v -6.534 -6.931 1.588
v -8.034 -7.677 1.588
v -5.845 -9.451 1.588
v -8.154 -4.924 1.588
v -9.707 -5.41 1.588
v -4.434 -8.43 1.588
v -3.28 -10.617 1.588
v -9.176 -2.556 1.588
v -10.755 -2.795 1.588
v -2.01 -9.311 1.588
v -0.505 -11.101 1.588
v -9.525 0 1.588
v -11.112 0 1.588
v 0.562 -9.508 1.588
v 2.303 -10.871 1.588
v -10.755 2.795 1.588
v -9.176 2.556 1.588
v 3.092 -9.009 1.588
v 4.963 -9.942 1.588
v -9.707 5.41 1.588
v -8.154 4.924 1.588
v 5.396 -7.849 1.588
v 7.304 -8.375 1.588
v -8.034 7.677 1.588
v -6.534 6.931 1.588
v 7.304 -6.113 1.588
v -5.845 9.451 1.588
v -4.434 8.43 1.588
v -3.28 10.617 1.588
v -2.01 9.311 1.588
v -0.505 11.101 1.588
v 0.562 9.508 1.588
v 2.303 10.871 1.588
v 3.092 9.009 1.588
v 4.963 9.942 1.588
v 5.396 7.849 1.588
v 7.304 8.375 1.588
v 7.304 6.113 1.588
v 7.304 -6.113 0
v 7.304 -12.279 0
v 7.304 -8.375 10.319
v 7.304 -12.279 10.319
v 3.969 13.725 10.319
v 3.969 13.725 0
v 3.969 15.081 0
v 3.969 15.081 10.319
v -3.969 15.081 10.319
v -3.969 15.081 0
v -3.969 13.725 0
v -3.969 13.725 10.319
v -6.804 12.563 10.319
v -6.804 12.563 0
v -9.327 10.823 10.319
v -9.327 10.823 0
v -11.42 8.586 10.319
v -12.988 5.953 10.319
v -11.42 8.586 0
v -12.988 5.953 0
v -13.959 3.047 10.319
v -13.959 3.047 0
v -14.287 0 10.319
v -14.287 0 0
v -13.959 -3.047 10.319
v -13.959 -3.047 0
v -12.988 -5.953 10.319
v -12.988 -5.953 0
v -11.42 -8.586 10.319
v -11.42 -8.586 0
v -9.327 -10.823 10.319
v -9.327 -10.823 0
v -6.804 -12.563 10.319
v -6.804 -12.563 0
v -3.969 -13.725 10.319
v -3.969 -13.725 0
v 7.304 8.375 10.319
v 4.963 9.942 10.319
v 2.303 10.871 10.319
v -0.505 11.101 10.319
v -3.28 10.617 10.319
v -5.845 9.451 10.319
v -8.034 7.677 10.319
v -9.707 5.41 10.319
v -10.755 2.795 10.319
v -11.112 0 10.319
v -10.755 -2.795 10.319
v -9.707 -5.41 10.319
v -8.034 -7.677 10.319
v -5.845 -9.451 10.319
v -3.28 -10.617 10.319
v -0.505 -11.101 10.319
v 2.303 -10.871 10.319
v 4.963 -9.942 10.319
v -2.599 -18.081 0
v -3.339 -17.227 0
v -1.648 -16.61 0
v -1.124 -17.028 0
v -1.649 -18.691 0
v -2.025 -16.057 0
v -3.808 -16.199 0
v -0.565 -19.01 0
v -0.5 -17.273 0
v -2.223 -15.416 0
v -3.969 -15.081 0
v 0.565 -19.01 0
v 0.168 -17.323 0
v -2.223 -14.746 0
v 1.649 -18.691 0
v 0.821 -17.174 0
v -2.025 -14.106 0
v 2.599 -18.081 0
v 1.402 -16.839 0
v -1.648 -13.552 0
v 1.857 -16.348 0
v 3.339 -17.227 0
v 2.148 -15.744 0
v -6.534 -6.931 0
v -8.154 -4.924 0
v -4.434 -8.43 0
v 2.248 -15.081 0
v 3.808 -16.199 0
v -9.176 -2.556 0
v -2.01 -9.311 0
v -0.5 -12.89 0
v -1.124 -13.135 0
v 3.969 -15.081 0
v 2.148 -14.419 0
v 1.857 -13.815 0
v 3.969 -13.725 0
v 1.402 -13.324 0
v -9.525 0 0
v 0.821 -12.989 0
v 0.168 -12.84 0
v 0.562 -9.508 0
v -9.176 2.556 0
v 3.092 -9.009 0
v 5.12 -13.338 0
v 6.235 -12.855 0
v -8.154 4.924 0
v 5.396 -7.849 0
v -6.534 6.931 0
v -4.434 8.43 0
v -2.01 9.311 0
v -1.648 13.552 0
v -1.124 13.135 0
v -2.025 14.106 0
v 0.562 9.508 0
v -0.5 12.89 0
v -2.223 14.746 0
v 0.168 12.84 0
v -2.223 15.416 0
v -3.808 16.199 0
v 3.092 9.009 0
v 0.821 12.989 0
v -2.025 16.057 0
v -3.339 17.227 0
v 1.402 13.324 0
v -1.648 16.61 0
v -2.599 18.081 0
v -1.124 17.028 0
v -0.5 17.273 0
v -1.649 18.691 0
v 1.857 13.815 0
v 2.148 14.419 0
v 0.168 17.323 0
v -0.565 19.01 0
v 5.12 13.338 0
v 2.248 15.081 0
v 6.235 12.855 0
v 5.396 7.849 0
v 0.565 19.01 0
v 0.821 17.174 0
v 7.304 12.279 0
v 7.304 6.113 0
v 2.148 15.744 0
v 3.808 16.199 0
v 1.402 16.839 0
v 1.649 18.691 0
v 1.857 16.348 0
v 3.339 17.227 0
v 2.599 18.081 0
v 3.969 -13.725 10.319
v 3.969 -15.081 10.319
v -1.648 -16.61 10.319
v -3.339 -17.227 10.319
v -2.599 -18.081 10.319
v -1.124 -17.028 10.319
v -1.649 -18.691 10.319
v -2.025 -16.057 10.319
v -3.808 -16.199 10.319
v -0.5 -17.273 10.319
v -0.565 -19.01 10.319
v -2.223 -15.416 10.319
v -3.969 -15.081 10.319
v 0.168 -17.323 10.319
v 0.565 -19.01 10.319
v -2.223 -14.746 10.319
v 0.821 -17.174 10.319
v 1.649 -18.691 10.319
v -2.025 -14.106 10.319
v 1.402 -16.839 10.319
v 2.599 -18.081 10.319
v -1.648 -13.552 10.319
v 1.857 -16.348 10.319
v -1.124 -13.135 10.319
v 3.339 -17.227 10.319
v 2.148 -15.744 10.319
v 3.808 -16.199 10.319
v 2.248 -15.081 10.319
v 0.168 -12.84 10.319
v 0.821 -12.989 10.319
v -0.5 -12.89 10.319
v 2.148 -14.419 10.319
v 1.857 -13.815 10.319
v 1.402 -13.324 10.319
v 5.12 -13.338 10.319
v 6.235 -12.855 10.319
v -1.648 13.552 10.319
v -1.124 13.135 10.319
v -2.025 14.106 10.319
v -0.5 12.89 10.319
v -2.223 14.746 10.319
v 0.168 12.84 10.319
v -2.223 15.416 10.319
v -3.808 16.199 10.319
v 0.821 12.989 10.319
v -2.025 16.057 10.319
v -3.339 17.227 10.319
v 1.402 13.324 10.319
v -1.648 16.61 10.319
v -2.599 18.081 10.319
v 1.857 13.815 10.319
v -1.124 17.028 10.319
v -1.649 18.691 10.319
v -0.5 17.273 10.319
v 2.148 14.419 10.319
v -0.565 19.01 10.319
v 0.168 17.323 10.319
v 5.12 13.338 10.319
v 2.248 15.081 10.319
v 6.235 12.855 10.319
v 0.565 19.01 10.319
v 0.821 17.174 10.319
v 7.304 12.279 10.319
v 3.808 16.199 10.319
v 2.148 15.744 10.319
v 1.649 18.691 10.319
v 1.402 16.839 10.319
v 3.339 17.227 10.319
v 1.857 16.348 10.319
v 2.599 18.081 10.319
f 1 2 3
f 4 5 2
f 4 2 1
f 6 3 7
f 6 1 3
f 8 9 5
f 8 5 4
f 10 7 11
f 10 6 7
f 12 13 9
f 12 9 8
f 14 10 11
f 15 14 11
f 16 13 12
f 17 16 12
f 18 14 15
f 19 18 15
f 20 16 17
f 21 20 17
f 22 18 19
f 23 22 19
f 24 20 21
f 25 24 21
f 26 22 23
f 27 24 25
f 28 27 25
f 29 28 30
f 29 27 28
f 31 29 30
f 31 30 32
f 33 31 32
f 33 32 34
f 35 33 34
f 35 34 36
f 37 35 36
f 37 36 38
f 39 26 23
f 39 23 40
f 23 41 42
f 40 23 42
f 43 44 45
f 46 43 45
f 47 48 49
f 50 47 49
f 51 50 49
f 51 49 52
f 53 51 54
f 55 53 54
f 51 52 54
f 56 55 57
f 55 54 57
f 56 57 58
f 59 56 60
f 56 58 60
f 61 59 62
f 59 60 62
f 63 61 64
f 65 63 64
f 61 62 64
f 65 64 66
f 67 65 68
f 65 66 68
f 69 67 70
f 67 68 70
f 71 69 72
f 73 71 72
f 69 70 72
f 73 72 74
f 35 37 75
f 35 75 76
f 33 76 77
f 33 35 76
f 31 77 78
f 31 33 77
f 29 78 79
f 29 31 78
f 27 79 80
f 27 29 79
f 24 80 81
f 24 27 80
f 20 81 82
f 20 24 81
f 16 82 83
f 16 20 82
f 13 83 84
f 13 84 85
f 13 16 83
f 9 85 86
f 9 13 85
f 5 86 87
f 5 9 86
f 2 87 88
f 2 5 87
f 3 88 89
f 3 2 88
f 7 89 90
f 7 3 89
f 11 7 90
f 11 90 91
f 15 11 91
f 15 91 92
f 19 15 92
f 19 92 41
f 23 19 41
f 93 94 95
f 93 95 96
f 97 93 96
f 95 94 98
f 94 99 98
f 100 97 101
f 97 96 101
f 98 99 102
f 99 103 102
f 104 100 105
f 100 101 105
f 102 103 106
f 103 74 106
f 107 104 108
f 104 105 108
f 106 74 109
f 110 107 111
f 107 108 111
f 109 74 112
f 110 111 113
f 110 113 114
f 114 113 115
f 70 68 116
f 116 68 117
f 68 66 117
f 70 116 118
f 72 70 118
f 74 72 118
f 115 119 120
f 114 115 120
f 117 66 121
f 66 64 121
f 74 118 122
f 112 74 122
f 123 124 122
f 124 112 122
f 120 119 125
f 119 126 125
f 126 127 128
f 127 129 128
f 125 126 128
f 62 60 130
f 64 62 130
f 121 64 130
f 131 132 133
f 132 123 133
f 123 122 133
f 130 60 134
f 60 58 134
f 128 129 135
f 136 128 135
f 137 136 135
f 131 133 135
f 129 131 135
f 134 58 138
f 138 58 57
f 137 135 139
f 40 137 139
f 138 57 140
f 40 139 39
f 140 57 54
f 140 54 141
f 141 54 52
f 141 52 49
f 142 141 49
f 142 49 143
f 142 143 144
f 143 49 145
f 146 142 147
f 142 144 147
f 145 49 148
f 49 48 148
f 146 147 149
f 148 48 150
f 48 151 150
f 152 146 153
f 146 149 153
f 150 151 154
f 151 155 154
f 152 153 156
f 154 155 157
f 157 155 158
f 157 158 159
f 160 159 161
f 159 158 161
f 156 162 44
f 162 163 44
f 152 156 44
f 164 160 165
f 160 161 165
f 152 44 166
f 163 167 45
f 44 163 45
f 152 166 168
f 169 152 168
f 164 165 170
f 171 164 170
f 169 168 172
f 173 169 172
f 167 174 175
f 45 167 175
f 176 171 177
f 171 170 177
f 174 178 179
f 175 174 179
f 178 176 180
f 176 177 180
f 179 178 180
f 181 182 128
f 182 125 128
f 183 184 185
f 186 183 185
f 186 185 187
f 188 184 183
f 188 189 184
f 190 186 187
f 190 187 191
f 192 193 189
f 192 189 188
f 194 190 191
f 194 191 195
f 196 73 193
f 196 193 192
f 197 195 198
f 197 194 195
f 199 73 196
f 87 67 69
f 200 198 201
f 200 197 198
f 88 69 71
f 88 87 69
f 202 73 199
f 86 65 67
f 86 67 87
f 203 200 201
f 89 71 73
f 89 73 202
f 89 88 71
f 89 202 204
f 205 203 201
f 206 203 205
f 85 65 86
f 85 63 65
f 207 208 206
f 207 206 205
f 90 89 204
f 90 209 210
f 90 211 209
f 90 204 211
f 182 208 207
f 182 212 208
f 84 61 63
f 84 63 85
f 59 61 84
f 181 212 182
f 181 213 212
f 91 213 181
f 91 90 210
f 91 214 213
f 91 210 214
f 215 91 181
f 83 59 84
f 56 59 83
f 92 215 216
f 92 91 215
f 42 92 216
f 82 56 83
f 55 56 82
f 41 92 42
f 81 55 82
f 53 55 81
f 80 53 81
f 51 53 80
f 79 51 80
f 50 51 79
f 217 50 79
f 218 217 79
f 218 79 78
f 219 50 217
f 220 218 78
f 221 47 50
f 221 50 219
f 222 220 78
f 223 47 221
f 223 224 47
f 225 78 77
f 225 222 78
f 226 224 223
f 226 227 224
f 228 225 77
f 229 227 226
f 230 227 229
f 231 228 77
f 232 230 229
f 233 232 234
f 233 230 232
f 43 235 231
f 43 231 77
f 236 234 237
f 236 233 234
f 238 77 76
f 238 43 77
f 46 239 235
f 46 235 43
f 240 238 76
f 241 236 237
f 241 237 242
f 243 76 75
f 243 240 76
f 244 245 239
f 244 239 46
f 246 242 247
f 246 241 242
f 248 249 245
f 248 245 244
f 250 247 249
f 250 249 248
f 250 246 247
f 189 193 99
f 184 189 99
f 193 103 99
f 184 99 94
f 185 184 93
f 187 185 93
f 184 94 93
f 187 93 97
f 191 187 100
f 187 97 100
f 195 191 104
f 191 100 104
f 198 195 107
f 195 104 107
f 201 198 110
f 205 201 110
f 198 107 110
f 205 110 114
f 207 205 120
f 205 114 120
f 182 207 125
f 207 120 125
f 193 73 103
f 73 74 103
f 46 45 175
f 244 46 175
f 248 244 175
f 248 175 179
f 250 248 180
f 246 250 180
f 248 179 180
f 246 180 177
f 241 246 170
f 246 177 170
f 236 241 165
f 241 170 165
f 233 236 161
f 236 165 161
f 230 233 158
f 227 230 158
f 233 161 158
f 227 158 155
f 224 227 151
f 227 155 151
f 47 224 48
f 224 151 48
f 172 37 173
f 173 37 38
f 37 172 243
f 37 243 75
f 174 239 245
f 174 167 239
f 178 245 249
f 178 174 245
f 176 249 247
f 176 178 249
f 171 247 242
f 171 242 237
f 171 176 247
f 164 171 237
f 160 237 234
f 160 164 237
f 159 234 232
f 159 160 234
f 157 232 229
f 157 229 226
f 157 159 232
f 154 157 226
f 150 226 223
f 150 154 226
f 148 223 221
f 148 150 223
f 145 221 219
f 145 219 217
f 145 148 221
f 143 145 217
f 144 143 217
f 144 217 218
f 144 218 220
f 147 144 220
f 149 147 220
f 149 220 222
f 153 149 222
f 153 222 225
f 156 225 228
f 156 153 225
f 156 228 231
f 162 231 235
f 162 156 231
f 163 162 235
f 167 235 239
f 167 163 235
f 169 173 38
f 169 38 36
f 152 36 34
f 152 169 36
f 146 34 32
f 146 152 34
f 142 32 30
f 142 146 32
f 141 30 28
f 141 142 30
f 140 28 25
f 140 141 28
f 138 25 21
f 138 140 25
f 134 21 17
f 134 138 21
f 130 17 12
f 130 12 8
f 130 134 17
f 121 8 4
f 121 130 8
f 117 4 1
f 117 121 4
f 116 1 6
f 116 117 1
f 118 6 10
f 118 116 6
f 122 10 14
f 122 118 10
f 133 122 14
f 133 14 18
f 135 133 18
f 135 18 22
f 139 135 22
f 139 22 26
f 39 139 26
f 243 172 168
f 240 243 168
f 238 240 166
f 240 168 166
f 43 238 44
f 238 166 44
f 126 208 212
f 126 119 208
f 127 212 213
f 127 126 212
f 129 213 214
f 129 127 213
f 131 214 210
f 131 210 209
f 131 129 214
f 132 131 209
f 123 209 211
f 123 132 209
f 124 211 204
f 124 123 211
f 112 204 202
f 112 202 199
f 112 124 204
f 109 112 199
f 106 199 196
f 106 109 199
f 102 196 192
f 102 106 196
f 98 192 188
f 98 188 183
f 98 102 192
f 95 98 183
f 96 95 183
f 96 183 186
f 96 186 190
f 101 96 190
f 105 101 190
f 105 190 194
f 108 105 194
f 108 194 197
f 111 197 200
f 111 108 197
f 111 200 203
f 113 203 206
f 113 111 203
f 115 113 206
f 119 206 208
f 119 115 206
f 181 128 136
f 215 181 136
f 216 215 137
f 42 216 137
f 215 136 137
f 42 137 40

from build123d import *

# Parameters (mm, degrees)
F0_R     = 2.2479
F0_R_2   = 9.525
F1_DEPTH = 1.5875
F2_R     = 2.2479
F2_R_2   = 11.1125
F3_DEPTH = 8.73125
F5_DEPTH = 10.31875


with BuildPart() as f1:
    # F0 (on Top) → F1 (new body)
    with BuildSketch(Plane.XY):
        with BuildLine():
            Line((3.96875, -15.08125), (3.96875, -13.725221))
            ThreePointArc((3.96875, -13.725221), (14.2875, 0), (3.96875, 13.725221))
            Line((3.96875, 13.725221), (3.96875, 15.08125))
            ThreePointArc((3.96875, 15.08125), (0, 19.05), (-3.96875, 15.08125))
            Line((-3.96875, 15.08125), (-3.96875, 13.725221))
            ThreePointArc((-3.96875, 13.725221), (-14.2875, 0), (-3.96875, -13.725221))
            Line((-3.96875, -13.725221), (-3.96875, -15.08125))
            ThreePointArc((-3.96875, -15.08125), (0, -19.05), (3.96875, -15.08125))
        make_face()
        with Locations((0, -15.08125)):
            Circle(F0_R, mode=Mode.SUBTRACT)
        Circle(F0_R_2, mode=Mode.SUBTRACT)
        with Locations((0, 15.08125)):
            Circle(F0_R, mode=Mode.SUBTRACT)
    extrude(amount=F1_DEPTH)

    # F2 (on face) → F3 (join)
    with BuildSketch(Plane.XY.offset(1.5875)):
        with BuildLine():
            ThreePointArc((-3.96875, 13.725221), (-14.2875, 0), (-3.96875, -13.725221))
            Line((-3.96875, -13.725221), (-3.96875, -15.08125))
            ThreePointArc((-3.96875, -15.08125), (0, -19.05), (3.96875, -15.08125))
            Line((3.96875, -15.08125), (3.96875, -13.725221))
            ThreePointArc((3.96875, -13.725221), (14.2875, 0), (3.96875, 13.725221))
            Line((3.96875, 13.725221), (3.96875, 15.08125))
            ThreePointArc((3.96875, 15.08125), (0, 19.05), (-3.96875, 15.08125))
            Line((-3.96875, 15.08125), (-3.96875, 13.725221))
        make_face()
        with Locations((0, -15.08125)):
            Circle(F2_R, mode=Mode.SUBTRACT)
        Circle(F2_R_2, mode=Mode.SUBTRACT)
        with Locations((0, 15.08125)):
            Circle(F2_R, mode=Mode.SUBTRACT)
    extrude(amount=F3_DEPTH)

    # F4 (on face) → F5 (cut, through all)
    with BuildSketch(Plane.XY.offset(10.31875)):
        Polygon((7.304354, 0), (7.304354, -14.2875), (14.2875, -14.2875), (14.2875, 14.2875), (7.304354, 14.2875), align=None)
    extrude(amount=-F5_DEPTH, mode=Mode.SUBTRACT)


solid = f1.part
